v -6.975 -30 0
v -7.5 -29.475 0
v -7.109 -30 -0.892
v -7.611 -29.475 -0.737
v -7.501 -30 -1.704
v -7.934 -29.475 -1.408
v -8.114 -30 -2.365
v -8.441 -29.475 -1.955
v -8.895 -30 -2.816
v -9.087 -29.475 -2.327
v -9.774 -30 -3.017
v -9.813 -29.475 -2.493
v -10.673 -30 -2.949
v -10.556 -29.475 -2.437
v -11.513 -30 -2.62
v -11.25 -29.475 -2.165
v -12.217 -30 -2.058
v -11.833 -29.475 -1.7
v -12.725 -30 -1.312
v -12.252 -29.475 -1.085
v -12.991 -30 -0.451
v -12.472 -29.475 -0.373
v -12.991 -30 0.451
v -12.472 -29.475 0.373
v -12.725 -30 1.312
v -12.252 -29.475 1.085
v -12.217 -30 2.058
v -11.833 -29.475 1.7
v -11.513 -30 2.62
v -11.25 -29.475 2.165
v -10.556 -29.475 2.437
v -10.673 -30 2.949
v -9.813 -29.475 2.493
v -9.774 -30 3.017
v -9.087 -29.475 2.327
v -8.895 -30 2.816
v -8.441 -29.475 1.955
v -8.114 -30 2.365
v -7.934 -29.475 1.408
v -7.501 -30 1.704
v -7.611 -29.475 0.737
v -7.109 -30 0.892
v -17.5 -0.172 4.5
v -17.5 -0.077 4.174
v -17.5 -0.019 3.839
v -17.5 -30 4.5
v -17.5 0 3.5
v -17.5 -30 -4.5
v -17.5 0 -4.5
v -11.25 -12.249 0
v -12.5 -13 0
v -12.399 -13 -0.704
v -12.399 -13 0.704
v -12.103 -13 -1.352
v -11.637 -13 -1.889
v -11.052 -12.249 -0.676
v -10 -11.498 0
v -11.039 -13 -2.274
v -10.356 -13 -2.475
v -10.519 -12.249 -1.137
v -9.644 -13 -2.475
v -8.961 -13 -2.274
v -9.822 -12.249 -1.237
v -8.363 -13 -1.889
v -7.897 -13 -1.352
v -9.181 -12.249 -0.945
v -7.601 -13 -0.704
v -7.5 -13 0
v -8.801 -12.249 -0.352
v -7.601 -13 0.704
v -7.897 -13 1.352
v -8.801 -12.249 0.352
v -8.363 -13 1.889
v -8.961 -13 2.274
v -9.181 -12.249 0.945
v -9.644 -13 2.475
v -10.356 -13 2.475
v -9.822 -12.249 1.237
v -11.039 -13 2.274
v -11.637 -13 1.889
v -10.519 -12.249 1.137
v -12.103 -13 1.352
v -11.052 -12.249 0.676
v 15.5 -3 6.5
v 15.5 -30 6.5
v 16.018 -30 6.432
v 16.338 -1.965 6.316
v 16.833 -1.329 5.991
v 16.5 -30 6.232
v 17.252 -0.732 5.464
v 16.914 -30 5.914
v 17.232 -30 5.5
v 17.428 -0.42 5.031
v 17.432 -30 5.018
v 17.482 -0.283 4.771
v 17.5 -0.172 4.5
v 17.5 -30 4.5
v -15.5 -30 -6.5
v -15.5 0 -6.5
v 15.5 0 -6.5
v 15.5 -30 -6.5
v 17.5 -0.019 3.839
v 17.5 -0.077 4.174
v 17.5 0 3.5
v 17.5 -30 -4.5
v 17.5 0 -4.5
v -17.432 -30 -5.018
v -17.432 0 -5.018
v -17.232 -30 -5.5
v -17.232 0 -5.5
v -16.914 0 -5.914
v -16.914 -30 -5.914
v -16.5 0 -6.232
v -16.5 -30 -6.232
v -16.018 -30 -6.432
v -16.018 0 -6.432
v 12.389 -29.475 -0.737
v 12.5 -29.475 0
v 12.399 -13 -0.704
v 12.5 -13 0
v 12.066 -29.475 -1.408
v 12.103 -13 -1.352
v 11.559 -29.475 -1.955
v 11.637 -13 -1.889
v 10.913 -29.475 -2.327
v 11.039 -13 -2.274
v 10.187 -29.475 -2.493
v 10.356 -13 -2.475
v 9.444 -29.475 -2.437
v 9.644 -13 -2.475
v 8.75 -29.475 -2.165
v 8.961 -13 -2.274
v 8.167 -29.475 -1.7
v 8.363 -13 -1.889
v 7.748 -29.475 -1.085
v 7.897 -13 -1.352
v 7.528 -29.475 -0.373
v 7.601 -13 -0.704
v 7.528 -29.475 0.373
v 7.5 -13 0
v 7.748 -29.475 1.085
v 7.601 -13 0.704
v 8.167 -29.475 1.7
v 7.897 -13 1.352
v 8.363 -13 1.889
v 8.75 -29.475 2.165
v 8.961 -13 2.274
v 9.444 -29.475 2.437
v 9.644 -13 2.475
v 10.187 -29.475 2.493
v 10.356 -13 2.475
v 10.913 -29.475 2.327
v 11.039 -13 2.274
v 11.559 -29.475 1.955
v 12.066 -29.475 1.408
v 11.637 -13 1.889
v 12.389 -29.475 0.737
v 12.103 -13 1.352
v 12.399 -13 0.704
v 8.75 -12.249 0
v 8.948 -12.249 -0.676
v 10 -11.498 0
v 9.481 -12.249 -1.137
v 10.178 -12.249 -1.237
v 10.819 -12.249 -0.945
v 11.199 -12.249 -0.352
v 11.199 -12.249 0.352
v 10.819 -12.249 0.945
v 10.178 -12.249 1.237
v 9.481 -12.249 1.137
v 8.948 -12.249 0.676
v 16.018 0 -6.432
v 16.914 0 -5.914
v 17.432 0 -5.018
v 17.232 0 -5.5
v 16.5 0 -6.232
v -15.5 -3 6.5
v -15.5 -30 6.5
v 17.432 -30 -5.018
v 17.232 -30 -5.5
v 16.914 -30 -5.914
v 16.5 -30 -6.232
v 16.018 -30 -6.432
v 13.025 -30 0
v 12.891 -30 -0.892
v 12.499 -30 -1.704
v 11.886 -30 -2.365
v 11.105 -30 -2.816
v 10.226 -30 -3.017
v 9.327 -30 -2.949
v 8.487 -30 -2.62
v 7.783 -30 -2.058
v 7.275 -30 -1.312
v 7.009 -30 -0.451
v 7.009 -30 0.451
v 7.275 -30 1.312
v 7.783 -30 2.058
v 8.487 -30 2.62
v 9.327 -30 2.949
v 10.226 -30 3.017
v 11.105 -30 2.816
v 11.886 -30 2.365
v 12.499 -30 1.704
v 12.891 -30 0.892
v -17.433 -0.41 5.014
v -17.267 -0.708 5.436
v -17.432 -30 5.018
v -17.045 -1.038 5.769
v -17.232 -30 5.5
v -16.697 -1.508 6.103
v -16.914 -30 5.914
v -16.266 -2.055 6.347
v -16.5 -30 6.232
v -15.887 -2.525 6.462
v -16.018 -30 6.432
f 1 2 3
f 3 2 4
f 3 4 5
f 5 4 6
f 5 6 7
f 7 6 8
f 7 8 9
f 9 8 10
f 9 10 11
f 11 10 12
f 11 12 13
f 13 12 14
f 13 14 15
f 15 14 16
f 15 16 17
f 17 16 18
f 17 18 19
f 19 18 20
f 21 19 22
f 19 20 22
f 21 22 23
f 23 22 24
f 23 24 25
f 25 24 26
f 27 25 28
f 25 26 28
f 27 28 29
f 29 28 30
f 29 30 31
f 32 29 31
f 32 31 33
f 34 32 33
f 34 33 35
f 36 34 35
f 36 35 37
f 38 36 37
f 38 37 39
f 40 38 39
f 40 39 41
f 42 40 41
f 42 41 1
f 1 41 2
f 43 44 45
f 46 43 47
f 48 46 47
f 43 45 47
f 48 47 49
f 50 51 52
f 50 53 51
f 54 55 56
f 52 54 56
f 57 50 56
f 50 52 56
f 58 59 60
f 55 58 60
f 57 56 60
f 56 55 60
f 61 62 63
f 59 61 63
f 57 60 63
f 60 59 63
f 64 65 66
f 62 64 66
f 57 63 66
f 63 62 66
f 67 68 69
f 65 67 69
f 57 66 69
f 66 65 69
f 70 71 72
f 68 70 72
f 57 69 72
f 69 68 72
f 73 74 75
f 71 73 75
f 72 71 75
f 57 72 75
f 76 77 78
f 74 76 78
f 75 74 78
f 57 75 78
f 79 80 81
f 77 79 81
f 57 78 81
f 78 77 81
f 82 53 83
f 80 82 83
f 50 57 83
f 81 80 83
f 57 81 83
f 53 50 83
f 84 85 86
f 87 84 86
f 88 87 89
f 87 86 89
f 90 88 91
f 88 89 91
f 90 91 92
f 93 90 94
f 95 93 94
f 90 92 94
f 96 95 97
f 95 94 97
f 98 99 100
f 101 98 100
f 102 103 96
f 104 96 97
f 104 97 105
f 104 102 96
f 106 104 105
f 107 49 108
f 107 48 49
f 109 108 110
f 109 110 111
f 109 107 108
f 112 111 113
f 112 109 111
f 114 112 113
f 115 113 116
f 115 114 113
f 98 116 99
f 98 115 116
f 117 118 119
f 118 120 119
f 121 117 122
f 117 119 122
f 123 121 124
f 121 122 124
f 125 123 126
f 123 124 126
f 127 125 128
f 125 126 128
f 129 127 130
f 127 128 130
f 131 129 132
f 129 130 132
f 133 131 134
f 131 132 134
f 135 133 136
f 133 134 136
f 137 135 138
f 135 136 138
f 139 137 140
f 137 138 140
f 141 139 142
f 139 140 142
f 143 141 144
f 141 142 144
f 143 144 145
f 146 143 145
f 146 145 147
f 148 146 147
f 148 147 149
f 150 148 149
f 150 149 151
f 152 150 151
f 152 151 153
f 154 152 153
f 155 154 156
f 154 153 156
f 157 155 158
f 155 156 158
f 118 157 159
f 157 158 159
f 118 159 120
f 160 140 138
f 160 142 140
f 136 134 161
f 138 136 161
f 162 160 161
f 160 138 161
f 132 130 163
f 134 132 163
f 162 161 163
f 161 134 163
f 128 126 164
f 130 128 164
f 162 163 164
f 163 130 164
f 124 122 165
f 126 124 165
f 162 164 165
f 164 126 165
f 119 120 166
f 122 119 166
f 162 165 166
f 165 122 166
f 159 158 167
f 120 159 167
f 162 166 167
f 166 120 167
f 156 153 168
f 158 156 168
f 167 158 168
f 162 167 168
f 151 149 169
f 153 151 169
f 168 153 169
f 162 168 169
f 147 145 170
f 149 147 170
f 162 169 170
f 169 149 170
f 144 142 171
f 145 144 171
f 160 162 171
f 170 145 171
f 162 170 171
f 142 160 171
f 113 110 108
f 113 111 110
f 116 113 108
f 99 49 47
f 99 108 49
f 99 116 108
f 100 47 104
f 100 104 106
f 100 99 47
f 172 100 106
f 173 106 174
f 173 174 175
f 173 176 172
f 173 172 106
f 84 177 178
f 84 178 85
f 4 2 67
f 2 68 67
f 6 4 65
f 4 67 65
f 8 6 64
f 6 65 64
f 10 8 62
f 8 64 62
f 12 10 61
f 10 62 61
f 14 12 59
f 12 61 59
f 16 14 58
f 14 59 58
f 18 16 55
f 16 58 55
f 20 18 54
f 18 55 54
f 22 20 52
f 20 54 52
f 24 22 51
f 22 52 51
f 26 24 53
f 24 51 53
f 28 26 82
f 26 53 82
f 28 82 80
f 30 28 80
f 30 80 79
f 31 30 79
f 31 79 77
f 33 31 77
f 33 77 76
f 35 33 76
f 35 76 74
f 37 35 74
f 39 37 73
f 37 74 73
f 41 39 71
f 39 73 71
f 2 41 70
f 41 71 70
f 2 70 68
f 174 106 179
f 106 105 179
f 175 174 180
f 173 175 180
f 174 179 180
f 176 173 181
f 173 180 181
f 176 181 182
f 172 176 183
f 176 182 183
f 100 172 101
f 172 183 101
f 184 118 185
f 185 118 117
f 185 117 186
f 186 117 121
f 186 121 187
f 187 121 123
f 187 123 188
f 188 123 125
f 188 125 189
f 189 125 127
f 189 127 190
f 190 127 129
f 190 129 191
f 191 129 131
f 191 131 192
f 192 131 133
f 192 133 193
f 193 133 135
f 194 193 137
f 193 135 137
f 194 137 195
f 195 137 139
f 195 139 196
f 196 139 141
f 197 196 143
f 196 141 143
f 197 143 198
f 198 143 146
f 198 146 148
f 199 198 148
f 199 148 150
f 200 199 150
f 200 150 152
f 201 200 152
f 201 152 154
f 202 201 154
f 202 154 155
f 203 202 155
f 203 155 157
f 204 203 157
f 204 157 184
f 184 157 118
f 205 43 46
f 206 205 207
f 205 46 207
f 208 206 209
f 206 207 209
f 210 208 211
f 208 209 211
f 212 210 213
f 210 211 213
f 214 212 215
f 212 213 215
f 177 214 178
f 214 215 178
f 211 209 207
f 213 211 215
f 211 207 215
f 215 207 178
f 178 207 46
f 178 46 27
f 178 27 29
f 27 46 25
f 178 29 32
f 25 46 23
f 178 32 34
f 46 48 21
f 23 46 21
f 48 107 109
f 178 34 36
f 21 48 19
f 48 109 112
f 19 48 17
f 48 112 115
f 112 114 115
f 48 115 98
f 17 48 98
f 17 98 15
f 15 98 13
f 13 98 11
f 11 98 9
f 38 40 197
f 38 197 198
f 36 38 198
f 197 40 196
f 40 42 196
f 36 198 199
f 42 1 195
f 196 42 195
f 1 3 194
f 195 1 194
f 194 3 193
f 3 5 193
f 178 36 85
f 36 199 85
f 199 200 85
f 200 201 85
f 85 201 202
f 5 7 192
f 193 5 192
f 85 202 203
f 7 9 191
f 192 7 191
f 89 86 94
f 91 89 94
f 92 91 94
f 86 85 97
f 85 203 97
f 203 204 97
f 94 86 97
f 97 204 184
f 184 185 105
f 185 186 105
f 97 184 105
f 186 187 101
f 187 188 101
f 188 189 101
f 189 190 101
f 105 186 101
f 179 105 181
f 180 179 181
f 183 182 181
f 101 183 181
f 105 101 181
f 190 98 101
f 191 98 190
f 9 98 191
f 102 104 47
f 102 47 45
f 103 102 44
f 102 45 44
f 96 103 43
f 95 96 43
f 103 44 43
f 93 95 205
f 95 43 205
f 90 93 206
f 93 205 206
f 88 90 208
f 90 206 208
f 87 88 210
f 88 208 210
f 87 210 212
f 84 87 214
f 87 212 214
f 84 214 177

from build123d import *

# Parameters (mm, degrees)
SKETCH1_W                   = 35
SKETCH1_H                   = 13
BOSS_EXTRUDE1_DEPTH         = 30
FILLET1_R                   = 2
FILLET2_R                   = 3
M6_TAPPED_HOLE1_D           = 5
M6_TAPPED_HOLE1_DEPTH       = 17
M6_TAPPED_HOLE1_CSINK_D     = 6.05
M6_TAPPED_HOLE1_CSINK_ANGLE = 90
M6_TAPPED_HOLE1_TIP         = 1.502151548


with BuildPart() as part:
    # Sketch1 → Boss-Extrude1 (new body)
    with BuildSketch(Plane(origin=(0, 0, 0), x_dir=(1, 0, 0), z_dir=(0, 1, 0))):
        Rectangle(SKETCH1_W, SKETCH1_H)
    extrude(amount=-BOSS_EXTRUDE1_DEPTH)

    # Fillet1
    fillet1_edges = [part.edges().sort_by_distance(p)[0] for p in [
        (17.5, -15, 6.5),
        (-17.5, -15, 6.5),
        (-17.5, -15, -6.5),
        (17.5, -15, -6.5),
    ]]
    fillet(fillet1_edges, radius=FILLET1_R)

    # Fillet2
    # the kernel refuses this fillet: 3 mm, written as the material it takes off along each edge
    with BuildSketch(Plane(origin=(-23, 0, 6.5), x_dir=(0, -1, 0), z_dir=(1, 0, 0))) as fillet2_piece_1:
        with BuildLine():
            CenterArc((FILLET2_R, FILLET2_R), FILLET2_R, 180, 90)
            Line((0, FILLET2_R), (0, 0))
            Line((0, 0), (FILLET2_R, 0))
        make_face()
    extrude(amount=46, mode=Mode.SUBTRACT)

    # M6 Tapped Hole1
    with Locations(Plane(origin=(0, -30, 0), x_dir=(-1, 0, 0), z_dir=(0, -1, 0))):
        with Locations((-10, 0), (10, 0)):
            CounterSinkHole(M6_TAPPED_HOLE1_D / 2, M6_TAPPED_HOLE1_CSINK_D / 2, depth=M6_TAPPED_HOLE1_DEPTH, counter_sink_angle=M6_TAPPED_HOLE1_CSINK_ANGLE)
            with Locations((0, 0, -(M6_TAPPED_HOLE1_DEPTH + M6_TAPPED_HOLE1_TIP / 2))):  # 118° drill point
                Cone(0, M6_TAPPED_HOLE1_D / 2, M6_TAPPED_HOLE1_TIP, mode=Mode.SUBTRACT)


solid = part.part
